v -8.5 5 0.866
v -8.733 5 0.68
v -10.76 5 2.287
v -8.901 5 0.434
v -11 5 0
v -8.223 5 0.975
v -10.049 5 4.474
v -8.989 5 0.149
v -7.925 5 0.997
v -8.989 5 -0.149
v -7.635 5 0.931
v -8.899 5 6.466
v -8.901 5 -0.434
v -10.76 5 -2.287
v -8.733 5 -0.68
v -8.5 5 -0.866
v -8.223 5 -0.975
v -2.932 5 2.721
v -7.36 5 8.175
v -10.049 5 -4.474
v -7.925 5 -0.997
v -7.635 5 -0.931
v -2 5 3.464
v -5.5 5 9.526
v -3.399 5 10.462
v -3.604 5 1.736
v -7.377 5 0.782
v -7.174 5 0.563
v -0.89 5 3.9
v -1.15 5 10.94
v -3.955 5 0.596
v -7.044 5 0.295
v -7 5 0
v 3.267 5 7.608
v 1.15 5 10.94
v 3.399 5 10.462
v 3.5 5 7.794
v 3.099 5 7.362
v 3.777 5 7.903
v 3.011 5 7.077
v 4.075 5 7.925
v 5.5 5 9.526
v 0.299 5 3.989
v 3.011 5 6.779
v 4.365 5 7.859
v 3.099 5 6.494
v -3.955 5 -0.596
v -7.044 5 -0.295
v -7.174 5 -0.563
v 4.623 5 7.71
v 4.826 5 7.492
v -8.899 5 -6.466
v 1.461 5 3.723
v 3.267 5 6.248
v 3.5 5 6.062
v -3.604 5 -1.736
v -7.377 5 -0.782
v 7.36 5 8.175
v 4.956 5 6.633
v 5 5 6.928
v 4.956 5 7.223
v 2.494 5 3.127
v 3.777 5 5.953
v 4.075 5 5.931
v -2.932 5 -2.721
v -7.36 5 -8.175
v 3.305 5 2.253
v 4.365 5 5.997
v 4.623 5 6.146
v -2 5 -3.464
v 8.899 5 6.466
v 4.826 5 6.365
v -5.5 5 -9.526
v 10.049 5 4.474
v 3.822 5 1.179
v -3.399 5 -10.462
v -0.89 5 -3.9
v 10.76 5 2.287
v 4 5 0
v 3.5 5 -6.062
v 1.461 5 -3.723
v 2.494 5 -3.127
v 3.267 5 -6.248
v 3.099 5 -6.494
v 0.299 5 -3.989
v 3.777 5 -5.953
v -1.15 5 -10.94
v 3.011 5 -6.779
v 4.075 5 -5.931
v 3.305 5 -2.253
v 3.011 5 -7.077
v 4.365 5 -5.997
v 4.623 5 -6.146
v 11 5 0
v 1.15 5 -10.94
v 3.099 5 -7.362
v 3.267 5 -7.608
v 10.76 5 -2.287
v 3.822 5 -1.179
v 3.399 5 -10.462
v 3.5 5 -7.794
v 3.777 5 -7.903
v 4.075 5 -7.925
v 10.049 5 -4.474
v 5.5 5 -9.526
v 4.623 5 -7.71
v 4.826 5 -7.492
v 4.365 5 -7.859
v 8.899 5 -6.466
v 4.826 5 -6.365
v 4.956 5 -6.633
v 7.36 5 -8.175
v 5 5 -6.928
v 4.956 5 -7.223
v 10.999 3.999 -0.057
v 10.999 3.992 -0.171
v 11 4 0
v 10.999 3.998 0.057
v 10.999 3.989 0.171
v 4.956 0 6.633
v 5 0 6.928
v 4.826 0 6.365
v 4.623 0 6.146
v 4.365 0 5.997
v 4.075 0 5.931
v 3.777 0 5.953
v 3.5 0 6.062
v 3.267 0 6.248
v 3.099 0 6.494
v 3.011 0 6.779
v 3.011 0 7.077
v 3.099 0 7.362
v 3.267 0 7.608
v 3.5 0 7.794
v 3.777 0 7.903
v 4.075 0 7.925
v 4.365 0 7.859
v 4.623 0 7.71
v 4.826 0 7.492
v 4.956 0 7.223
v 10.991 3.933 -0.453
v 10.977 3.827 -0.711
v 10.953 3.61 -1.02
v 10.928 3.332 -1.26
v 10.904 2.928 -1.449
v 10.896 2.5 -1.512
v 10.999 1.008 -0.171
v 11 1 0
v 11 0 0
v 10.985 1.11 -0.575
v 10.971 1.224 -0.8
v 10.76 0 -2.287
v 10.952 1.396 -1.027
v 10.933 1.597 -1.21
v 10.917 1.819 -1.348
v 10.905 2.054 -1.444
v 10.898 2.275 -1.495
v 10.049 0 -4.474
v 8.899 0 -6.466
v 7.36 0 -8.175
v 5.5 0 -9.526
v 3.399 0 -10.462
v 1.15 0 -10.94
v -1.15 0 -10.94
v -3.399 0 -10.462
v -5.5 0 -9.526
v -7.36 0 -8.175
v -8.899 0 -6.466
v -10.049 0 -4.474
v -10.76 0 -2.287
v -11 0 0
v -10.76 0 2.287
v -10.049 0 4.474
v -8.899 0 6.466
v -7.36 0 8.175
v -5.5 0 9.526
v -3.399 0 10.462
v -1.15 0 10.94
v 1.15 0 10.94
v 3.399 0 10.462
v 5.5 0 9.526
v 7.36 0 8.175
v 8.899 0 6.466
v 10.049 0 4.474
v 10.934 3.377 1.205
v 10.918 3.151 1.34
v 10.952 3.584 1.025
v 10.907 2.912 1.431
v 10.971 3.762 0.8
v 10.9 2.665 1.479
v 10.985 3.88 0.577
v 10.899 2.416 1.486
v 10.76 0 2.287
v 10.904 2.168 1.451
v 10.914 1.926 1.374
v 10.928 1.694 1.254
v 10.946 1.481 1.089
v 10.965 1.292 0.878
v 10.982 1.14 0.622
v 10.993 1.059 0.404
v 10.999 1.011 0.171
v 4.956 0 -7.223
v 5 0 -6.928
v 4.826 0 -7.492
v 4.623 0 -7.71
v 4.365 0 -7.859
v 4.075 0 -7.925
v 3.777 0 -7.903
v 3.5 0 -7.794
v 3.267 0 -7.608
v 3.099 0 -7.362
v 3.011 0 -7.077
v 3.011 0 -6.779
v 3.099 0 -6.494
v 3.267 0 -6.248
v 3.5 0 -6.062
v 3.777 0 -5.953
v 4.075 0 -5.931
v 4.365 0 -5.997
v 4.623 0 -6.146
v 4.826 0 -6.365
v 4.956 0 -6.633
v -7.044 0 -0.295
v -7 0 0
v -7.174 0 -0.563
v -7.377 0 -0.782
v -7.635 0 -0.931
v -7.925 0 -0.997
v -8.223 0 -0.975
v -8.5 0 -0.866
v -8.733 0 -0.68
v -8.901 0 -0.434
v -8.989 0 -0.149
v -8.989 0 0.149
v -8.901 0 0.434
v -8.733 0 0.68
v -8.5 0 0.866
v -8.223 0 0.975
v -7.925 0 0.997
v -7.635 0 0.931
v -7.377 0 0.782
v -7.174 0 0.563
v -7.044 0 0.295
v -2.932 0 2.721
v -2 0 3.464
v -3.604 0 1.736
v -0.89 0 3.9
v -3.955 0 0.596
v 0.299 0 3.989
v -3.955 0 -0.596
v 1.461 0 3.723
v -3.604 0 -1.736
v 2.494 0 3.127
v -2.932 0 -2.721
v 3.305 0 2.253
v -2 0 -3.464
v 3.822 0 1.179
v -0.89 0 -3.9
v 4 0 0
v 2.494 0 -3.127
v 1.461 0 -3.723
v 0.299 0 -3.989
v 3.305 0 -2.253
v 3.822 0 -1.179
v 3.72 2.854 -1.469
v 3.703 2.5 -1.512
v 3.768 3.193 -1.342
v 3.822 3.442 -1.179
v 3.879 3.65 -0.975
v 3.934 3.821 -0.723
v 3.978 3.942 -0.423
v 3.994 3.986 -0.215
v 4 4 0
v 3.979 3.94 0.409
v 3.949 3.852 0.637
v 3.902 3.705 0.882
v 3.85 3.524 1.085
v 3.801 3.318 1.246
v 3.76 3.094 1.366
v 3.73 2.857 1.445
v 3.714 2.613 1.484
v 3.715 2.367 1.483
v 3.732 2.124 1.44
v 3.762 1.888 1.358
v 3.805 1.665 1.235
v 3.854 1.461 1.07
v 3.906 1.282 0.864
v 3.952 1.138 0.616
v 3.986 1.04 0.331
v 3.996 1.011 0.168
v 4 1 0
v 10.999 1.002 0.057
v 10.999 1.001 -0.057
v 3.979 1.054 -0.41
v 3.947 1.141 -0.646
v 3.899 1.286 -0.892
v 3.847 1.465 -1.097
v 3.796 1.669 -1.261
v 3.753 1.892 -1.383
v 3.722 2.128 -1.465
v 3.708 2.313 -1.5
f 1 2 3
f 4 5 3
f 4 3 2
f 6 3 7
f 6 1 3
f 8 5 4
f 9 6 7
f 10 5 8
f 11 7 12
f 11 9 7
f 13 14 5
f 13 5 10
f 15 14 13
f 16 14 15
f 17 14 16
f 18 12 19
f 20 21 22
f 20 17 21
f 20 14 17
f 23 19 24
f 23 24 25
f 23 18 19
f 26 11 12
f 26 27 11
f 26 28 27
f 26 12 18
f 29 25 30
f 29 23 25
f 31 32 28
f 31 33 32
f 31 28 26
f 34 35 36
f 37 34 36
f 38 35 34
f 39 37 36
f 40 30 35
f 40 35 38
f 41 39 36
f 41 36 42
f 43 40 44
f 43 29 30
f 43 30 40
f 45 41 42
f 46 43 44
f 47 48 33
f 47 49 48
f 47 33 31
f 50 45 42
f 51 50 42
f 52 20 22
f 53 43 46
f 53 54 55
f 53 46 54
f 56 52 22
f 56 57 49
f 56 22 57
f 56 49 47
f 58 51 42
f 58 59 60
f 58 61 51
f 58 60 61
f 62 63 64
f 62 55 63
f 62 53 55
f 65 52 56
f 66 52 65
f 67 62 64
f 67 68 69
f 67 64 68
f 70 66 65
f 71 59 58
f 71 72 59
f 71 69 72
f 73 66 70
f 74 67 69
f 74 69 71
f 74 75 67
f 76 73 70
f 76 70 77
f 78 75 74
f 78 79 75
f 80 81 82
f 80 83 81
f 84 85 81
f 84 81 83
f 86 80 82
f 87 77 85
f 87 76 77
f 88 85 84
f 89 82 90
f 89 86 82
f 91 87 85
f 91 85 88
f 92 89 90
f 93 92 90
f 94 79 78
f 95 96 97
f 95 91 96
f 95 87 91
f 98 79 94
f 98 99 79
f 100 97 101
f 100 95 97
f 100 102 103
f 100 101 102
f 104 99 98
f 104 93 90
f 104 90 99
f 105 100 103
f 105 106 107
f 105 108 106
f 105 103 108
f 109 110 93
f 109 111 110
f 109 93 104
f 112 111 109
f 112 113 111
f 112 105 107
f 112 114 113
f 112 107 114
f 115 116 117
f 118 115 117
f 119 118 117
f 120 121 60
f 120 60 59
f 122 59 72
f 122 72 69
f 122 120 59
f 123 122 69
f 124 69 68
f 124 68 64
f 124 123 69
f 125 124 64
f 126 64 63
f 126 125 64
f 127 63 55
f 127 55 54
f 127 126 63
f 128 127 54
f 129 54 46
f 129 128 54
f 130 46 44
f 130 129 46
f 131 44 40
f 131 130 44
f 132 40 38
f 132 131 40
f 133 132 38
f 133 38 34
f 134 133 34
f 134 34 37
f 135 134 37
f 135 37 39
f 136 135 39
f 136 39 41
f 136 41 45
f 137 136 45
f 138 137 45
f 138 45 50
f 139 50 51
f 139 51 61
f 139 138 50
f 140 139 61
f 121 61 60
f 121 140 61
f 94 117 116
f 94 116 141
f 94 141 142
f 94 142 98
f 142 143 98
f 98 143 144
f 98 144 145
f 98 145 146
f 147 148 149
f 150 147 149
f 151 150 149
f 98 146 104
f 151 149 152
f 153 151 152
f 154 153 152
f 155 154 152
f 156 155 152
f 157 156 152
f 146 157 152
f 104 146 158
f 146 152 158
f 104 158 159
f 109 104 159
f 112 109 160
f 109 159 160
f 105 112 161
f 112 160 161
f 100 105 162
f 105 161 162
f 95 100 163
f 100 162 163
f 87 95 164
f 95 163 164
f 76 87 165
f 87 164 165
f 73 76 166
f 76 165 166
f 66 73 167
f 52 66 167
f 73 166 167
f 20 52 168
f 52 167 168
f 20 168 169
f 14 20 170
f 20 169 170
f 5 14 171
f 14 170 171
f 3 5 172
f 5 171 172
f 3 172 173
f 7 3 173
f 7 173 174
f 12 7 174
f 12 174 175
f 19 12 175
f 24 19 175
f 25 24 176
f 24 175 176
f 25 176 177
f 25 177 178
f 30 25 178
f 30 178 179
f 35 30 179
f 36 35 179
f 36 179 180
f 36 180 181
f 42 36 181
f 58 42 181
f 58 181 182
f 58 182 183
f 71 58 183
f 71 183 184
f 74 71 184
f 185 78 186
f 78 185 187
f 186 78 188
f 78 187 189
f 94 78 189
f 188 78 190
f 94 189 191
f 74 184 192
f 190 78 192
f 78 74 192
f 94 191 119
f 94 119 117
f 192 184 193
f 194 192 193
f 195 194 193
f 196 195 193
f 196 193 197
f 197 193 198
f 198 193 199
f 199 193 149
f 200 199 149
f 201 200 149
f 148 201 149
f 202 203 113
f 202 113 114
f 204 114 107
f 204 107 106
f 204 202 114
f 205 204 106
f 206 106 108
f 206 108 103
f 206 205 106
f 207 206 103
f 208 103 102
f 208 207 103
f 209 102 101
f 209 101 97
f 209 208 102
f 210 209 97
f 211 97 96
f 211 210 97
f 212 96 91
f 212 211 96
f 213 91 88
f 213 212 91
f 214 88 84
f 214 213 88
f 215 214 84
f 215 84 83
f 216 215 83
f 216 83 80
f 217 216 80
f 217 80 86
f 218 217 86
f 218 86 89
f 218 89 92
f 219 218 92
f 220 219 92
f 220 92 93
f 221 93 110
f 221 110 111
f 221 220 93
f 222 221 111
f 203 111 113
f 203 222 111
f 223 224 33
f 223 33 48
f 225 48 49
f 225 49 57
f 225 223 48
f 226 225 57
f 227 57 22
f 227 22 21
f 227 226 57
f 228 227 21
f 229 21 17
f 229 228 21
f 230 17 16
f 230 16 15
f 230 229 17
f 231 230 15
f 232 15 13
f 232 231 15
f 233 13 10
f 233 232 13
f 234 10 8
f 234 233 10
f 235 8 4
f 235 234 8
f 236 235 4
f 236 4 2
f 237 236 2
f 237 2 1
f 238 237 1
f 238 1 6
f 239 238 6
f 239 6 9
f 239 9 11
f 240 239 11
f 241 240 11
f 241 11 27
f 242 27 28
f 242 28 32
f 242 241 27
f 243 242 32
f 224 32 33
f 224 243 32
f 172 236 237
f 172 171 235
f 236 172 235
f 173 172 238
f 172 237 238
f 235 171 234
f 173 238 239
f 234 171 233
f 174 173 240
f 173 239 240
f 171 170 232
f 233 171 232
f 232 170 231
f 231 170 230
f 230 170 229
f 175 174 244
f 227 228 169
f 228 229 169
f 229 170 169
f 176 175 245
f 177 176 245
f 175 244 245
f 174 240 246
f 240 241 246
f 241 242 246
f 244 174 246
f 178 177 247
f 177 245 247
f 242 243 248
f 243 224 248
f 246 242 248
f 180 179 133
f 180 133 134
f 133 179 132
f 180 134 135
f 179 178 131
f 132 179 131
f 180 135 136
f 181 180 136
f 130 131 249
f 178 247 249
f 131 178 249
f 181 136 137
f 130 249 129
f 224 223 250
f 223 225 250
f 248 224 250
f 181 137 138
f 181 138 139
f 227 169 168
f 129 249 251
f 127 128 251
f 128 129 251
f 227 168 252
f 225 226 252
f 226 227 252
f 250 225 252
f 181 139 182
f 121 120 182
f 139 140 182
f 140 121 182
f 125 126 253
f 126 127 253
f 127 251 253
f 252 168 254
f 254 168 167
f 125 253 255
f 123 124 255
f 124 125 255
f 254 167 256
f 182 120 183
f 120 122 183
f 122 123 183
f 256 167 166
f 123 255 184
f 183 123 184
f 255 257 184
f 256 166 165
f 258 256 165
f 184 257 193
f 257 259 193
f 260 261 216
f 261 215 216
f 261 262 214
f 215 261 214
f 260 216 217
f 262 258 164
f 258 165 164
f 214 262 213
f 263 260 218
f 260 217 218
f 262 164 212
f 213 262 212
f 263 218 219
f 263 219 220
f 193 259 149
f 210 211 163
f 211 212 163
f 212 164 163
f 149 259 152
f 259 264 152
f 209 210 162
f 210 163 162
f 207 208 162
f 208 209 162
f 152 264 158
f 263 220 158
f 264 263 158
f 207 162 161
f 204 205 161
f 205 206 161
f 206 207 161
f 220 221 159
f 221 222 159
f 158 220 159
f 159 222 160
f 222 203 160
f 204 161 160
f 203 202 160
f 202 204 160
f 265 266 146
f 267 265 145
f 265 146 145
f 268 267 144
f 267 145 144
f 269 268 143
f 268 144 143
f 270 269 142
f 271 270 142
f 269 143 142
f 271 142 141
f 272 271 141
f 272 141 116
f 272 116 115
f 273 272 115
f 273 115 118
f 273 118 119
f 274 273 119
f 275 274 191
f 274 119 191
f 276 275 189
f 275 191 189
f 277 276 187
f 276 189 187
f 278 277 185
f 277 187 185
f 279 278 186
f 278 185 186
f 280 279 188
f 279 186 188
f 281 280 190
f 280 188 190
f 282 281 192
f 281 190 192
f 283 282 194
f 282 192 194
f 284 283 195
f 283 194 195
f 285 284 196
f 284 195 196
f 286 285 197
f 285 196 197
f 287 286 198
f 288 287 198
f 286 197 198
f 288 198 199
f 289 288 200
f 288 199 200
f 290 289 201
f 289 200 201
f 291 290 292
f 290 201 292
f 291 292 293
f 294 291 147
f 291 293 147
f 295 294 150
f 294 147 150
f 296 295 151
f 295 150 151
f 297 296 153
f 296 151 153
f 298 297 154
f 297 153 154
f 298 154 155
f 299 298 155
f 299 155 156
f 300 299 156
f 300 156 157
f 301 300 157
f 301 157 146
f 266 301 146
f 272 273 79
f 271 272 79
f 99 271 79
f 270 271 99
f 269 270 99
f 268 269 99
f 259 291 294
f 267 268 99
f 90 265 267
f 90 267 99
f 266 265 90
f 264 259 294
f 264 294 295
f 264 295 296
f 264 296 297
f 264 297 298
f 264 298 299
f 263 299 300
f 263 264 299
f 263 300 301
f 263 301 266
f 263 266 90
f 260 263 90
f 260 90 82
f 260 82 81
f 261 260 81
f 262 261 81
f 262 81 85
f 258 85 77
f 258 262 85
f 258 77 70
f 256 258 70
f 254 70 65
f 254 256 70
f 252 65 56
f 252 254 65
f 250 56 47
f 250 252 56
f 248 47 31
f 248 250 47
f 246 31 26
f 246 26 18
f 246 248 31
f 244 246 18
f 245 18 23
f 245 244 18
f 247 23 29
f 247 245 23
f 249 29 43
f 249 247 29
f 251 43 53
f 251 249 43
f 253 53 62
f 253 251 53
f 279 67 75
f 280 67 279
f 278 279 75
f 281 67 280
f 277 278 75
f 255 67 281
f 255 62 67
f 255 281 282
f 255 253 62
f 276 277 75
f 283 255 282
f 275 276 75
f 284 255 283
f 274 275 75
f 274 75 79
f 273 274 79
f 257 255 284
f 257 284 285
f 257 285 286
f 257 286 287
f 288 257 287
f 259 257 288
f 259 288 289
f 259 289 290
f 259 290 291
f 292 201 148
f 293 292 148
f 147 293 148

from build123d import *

# Parameters (mm, degrees)
SKETCH1_R               = 11
SKETCH1_R_2             = 4
SKETCH1_R_3             = 1
BOSS_EXTRUDE1_DEPTH     = 5
CUT_EXTRUDE1_DEPTH      = 10
CUT_EXTRUDE1_DEPTH_BACK = 10
SKETCH2_R               = 1.5


with BuildPart() as part:
    # Sketch1 → Boss-Extrude1 (new body)
    with BuildSketch(Plane(origin=(0, 0, 0), x_dir=(1, 0, 0), z_dir=(0, 1, 0))):
        Circle(SKETCH1_R)
        Circle(SKETCH1_R_2, mode=Mode.SUBTRACT)
        with Locations((-8, 0)):
            Circle(SKETCH1_R_3, mode=Mode.SUBTRACT)
        with Locations((4, 6.92820323)):
            Circle(SKETCH1_R_3, mode=Mode.SUBTRACT)
        with Locations((4, -6.92820323)):
            Circle(SKETCH1_R_3, mode=Mode.SUBTRACT)
    extrude(amount=BOSS_EXTRUDE1_DEPTH)

    # Sketch2 → Cut-Extrude1 (cut, two sides: drawn at the far end of the back side and taken through both)
    with BuildSketch(Plane(origin=(10.998674606, 0, 0), x_dir=(0, 0, -1), z_dir=(1, 0, 0)).offset(-CUT_EXTRUDE1_DEPTH_BACK)):
        with Locations((0.011578062, 2.49997319)):
            Circle(SKETCH2_R)
    extrude(amount=CUT_EXTRUDE1_DEPTH + CUT_EXTRUDE1_DEPTH_BACK, mode=Mode.SUBTRACT)


solid = part.part
